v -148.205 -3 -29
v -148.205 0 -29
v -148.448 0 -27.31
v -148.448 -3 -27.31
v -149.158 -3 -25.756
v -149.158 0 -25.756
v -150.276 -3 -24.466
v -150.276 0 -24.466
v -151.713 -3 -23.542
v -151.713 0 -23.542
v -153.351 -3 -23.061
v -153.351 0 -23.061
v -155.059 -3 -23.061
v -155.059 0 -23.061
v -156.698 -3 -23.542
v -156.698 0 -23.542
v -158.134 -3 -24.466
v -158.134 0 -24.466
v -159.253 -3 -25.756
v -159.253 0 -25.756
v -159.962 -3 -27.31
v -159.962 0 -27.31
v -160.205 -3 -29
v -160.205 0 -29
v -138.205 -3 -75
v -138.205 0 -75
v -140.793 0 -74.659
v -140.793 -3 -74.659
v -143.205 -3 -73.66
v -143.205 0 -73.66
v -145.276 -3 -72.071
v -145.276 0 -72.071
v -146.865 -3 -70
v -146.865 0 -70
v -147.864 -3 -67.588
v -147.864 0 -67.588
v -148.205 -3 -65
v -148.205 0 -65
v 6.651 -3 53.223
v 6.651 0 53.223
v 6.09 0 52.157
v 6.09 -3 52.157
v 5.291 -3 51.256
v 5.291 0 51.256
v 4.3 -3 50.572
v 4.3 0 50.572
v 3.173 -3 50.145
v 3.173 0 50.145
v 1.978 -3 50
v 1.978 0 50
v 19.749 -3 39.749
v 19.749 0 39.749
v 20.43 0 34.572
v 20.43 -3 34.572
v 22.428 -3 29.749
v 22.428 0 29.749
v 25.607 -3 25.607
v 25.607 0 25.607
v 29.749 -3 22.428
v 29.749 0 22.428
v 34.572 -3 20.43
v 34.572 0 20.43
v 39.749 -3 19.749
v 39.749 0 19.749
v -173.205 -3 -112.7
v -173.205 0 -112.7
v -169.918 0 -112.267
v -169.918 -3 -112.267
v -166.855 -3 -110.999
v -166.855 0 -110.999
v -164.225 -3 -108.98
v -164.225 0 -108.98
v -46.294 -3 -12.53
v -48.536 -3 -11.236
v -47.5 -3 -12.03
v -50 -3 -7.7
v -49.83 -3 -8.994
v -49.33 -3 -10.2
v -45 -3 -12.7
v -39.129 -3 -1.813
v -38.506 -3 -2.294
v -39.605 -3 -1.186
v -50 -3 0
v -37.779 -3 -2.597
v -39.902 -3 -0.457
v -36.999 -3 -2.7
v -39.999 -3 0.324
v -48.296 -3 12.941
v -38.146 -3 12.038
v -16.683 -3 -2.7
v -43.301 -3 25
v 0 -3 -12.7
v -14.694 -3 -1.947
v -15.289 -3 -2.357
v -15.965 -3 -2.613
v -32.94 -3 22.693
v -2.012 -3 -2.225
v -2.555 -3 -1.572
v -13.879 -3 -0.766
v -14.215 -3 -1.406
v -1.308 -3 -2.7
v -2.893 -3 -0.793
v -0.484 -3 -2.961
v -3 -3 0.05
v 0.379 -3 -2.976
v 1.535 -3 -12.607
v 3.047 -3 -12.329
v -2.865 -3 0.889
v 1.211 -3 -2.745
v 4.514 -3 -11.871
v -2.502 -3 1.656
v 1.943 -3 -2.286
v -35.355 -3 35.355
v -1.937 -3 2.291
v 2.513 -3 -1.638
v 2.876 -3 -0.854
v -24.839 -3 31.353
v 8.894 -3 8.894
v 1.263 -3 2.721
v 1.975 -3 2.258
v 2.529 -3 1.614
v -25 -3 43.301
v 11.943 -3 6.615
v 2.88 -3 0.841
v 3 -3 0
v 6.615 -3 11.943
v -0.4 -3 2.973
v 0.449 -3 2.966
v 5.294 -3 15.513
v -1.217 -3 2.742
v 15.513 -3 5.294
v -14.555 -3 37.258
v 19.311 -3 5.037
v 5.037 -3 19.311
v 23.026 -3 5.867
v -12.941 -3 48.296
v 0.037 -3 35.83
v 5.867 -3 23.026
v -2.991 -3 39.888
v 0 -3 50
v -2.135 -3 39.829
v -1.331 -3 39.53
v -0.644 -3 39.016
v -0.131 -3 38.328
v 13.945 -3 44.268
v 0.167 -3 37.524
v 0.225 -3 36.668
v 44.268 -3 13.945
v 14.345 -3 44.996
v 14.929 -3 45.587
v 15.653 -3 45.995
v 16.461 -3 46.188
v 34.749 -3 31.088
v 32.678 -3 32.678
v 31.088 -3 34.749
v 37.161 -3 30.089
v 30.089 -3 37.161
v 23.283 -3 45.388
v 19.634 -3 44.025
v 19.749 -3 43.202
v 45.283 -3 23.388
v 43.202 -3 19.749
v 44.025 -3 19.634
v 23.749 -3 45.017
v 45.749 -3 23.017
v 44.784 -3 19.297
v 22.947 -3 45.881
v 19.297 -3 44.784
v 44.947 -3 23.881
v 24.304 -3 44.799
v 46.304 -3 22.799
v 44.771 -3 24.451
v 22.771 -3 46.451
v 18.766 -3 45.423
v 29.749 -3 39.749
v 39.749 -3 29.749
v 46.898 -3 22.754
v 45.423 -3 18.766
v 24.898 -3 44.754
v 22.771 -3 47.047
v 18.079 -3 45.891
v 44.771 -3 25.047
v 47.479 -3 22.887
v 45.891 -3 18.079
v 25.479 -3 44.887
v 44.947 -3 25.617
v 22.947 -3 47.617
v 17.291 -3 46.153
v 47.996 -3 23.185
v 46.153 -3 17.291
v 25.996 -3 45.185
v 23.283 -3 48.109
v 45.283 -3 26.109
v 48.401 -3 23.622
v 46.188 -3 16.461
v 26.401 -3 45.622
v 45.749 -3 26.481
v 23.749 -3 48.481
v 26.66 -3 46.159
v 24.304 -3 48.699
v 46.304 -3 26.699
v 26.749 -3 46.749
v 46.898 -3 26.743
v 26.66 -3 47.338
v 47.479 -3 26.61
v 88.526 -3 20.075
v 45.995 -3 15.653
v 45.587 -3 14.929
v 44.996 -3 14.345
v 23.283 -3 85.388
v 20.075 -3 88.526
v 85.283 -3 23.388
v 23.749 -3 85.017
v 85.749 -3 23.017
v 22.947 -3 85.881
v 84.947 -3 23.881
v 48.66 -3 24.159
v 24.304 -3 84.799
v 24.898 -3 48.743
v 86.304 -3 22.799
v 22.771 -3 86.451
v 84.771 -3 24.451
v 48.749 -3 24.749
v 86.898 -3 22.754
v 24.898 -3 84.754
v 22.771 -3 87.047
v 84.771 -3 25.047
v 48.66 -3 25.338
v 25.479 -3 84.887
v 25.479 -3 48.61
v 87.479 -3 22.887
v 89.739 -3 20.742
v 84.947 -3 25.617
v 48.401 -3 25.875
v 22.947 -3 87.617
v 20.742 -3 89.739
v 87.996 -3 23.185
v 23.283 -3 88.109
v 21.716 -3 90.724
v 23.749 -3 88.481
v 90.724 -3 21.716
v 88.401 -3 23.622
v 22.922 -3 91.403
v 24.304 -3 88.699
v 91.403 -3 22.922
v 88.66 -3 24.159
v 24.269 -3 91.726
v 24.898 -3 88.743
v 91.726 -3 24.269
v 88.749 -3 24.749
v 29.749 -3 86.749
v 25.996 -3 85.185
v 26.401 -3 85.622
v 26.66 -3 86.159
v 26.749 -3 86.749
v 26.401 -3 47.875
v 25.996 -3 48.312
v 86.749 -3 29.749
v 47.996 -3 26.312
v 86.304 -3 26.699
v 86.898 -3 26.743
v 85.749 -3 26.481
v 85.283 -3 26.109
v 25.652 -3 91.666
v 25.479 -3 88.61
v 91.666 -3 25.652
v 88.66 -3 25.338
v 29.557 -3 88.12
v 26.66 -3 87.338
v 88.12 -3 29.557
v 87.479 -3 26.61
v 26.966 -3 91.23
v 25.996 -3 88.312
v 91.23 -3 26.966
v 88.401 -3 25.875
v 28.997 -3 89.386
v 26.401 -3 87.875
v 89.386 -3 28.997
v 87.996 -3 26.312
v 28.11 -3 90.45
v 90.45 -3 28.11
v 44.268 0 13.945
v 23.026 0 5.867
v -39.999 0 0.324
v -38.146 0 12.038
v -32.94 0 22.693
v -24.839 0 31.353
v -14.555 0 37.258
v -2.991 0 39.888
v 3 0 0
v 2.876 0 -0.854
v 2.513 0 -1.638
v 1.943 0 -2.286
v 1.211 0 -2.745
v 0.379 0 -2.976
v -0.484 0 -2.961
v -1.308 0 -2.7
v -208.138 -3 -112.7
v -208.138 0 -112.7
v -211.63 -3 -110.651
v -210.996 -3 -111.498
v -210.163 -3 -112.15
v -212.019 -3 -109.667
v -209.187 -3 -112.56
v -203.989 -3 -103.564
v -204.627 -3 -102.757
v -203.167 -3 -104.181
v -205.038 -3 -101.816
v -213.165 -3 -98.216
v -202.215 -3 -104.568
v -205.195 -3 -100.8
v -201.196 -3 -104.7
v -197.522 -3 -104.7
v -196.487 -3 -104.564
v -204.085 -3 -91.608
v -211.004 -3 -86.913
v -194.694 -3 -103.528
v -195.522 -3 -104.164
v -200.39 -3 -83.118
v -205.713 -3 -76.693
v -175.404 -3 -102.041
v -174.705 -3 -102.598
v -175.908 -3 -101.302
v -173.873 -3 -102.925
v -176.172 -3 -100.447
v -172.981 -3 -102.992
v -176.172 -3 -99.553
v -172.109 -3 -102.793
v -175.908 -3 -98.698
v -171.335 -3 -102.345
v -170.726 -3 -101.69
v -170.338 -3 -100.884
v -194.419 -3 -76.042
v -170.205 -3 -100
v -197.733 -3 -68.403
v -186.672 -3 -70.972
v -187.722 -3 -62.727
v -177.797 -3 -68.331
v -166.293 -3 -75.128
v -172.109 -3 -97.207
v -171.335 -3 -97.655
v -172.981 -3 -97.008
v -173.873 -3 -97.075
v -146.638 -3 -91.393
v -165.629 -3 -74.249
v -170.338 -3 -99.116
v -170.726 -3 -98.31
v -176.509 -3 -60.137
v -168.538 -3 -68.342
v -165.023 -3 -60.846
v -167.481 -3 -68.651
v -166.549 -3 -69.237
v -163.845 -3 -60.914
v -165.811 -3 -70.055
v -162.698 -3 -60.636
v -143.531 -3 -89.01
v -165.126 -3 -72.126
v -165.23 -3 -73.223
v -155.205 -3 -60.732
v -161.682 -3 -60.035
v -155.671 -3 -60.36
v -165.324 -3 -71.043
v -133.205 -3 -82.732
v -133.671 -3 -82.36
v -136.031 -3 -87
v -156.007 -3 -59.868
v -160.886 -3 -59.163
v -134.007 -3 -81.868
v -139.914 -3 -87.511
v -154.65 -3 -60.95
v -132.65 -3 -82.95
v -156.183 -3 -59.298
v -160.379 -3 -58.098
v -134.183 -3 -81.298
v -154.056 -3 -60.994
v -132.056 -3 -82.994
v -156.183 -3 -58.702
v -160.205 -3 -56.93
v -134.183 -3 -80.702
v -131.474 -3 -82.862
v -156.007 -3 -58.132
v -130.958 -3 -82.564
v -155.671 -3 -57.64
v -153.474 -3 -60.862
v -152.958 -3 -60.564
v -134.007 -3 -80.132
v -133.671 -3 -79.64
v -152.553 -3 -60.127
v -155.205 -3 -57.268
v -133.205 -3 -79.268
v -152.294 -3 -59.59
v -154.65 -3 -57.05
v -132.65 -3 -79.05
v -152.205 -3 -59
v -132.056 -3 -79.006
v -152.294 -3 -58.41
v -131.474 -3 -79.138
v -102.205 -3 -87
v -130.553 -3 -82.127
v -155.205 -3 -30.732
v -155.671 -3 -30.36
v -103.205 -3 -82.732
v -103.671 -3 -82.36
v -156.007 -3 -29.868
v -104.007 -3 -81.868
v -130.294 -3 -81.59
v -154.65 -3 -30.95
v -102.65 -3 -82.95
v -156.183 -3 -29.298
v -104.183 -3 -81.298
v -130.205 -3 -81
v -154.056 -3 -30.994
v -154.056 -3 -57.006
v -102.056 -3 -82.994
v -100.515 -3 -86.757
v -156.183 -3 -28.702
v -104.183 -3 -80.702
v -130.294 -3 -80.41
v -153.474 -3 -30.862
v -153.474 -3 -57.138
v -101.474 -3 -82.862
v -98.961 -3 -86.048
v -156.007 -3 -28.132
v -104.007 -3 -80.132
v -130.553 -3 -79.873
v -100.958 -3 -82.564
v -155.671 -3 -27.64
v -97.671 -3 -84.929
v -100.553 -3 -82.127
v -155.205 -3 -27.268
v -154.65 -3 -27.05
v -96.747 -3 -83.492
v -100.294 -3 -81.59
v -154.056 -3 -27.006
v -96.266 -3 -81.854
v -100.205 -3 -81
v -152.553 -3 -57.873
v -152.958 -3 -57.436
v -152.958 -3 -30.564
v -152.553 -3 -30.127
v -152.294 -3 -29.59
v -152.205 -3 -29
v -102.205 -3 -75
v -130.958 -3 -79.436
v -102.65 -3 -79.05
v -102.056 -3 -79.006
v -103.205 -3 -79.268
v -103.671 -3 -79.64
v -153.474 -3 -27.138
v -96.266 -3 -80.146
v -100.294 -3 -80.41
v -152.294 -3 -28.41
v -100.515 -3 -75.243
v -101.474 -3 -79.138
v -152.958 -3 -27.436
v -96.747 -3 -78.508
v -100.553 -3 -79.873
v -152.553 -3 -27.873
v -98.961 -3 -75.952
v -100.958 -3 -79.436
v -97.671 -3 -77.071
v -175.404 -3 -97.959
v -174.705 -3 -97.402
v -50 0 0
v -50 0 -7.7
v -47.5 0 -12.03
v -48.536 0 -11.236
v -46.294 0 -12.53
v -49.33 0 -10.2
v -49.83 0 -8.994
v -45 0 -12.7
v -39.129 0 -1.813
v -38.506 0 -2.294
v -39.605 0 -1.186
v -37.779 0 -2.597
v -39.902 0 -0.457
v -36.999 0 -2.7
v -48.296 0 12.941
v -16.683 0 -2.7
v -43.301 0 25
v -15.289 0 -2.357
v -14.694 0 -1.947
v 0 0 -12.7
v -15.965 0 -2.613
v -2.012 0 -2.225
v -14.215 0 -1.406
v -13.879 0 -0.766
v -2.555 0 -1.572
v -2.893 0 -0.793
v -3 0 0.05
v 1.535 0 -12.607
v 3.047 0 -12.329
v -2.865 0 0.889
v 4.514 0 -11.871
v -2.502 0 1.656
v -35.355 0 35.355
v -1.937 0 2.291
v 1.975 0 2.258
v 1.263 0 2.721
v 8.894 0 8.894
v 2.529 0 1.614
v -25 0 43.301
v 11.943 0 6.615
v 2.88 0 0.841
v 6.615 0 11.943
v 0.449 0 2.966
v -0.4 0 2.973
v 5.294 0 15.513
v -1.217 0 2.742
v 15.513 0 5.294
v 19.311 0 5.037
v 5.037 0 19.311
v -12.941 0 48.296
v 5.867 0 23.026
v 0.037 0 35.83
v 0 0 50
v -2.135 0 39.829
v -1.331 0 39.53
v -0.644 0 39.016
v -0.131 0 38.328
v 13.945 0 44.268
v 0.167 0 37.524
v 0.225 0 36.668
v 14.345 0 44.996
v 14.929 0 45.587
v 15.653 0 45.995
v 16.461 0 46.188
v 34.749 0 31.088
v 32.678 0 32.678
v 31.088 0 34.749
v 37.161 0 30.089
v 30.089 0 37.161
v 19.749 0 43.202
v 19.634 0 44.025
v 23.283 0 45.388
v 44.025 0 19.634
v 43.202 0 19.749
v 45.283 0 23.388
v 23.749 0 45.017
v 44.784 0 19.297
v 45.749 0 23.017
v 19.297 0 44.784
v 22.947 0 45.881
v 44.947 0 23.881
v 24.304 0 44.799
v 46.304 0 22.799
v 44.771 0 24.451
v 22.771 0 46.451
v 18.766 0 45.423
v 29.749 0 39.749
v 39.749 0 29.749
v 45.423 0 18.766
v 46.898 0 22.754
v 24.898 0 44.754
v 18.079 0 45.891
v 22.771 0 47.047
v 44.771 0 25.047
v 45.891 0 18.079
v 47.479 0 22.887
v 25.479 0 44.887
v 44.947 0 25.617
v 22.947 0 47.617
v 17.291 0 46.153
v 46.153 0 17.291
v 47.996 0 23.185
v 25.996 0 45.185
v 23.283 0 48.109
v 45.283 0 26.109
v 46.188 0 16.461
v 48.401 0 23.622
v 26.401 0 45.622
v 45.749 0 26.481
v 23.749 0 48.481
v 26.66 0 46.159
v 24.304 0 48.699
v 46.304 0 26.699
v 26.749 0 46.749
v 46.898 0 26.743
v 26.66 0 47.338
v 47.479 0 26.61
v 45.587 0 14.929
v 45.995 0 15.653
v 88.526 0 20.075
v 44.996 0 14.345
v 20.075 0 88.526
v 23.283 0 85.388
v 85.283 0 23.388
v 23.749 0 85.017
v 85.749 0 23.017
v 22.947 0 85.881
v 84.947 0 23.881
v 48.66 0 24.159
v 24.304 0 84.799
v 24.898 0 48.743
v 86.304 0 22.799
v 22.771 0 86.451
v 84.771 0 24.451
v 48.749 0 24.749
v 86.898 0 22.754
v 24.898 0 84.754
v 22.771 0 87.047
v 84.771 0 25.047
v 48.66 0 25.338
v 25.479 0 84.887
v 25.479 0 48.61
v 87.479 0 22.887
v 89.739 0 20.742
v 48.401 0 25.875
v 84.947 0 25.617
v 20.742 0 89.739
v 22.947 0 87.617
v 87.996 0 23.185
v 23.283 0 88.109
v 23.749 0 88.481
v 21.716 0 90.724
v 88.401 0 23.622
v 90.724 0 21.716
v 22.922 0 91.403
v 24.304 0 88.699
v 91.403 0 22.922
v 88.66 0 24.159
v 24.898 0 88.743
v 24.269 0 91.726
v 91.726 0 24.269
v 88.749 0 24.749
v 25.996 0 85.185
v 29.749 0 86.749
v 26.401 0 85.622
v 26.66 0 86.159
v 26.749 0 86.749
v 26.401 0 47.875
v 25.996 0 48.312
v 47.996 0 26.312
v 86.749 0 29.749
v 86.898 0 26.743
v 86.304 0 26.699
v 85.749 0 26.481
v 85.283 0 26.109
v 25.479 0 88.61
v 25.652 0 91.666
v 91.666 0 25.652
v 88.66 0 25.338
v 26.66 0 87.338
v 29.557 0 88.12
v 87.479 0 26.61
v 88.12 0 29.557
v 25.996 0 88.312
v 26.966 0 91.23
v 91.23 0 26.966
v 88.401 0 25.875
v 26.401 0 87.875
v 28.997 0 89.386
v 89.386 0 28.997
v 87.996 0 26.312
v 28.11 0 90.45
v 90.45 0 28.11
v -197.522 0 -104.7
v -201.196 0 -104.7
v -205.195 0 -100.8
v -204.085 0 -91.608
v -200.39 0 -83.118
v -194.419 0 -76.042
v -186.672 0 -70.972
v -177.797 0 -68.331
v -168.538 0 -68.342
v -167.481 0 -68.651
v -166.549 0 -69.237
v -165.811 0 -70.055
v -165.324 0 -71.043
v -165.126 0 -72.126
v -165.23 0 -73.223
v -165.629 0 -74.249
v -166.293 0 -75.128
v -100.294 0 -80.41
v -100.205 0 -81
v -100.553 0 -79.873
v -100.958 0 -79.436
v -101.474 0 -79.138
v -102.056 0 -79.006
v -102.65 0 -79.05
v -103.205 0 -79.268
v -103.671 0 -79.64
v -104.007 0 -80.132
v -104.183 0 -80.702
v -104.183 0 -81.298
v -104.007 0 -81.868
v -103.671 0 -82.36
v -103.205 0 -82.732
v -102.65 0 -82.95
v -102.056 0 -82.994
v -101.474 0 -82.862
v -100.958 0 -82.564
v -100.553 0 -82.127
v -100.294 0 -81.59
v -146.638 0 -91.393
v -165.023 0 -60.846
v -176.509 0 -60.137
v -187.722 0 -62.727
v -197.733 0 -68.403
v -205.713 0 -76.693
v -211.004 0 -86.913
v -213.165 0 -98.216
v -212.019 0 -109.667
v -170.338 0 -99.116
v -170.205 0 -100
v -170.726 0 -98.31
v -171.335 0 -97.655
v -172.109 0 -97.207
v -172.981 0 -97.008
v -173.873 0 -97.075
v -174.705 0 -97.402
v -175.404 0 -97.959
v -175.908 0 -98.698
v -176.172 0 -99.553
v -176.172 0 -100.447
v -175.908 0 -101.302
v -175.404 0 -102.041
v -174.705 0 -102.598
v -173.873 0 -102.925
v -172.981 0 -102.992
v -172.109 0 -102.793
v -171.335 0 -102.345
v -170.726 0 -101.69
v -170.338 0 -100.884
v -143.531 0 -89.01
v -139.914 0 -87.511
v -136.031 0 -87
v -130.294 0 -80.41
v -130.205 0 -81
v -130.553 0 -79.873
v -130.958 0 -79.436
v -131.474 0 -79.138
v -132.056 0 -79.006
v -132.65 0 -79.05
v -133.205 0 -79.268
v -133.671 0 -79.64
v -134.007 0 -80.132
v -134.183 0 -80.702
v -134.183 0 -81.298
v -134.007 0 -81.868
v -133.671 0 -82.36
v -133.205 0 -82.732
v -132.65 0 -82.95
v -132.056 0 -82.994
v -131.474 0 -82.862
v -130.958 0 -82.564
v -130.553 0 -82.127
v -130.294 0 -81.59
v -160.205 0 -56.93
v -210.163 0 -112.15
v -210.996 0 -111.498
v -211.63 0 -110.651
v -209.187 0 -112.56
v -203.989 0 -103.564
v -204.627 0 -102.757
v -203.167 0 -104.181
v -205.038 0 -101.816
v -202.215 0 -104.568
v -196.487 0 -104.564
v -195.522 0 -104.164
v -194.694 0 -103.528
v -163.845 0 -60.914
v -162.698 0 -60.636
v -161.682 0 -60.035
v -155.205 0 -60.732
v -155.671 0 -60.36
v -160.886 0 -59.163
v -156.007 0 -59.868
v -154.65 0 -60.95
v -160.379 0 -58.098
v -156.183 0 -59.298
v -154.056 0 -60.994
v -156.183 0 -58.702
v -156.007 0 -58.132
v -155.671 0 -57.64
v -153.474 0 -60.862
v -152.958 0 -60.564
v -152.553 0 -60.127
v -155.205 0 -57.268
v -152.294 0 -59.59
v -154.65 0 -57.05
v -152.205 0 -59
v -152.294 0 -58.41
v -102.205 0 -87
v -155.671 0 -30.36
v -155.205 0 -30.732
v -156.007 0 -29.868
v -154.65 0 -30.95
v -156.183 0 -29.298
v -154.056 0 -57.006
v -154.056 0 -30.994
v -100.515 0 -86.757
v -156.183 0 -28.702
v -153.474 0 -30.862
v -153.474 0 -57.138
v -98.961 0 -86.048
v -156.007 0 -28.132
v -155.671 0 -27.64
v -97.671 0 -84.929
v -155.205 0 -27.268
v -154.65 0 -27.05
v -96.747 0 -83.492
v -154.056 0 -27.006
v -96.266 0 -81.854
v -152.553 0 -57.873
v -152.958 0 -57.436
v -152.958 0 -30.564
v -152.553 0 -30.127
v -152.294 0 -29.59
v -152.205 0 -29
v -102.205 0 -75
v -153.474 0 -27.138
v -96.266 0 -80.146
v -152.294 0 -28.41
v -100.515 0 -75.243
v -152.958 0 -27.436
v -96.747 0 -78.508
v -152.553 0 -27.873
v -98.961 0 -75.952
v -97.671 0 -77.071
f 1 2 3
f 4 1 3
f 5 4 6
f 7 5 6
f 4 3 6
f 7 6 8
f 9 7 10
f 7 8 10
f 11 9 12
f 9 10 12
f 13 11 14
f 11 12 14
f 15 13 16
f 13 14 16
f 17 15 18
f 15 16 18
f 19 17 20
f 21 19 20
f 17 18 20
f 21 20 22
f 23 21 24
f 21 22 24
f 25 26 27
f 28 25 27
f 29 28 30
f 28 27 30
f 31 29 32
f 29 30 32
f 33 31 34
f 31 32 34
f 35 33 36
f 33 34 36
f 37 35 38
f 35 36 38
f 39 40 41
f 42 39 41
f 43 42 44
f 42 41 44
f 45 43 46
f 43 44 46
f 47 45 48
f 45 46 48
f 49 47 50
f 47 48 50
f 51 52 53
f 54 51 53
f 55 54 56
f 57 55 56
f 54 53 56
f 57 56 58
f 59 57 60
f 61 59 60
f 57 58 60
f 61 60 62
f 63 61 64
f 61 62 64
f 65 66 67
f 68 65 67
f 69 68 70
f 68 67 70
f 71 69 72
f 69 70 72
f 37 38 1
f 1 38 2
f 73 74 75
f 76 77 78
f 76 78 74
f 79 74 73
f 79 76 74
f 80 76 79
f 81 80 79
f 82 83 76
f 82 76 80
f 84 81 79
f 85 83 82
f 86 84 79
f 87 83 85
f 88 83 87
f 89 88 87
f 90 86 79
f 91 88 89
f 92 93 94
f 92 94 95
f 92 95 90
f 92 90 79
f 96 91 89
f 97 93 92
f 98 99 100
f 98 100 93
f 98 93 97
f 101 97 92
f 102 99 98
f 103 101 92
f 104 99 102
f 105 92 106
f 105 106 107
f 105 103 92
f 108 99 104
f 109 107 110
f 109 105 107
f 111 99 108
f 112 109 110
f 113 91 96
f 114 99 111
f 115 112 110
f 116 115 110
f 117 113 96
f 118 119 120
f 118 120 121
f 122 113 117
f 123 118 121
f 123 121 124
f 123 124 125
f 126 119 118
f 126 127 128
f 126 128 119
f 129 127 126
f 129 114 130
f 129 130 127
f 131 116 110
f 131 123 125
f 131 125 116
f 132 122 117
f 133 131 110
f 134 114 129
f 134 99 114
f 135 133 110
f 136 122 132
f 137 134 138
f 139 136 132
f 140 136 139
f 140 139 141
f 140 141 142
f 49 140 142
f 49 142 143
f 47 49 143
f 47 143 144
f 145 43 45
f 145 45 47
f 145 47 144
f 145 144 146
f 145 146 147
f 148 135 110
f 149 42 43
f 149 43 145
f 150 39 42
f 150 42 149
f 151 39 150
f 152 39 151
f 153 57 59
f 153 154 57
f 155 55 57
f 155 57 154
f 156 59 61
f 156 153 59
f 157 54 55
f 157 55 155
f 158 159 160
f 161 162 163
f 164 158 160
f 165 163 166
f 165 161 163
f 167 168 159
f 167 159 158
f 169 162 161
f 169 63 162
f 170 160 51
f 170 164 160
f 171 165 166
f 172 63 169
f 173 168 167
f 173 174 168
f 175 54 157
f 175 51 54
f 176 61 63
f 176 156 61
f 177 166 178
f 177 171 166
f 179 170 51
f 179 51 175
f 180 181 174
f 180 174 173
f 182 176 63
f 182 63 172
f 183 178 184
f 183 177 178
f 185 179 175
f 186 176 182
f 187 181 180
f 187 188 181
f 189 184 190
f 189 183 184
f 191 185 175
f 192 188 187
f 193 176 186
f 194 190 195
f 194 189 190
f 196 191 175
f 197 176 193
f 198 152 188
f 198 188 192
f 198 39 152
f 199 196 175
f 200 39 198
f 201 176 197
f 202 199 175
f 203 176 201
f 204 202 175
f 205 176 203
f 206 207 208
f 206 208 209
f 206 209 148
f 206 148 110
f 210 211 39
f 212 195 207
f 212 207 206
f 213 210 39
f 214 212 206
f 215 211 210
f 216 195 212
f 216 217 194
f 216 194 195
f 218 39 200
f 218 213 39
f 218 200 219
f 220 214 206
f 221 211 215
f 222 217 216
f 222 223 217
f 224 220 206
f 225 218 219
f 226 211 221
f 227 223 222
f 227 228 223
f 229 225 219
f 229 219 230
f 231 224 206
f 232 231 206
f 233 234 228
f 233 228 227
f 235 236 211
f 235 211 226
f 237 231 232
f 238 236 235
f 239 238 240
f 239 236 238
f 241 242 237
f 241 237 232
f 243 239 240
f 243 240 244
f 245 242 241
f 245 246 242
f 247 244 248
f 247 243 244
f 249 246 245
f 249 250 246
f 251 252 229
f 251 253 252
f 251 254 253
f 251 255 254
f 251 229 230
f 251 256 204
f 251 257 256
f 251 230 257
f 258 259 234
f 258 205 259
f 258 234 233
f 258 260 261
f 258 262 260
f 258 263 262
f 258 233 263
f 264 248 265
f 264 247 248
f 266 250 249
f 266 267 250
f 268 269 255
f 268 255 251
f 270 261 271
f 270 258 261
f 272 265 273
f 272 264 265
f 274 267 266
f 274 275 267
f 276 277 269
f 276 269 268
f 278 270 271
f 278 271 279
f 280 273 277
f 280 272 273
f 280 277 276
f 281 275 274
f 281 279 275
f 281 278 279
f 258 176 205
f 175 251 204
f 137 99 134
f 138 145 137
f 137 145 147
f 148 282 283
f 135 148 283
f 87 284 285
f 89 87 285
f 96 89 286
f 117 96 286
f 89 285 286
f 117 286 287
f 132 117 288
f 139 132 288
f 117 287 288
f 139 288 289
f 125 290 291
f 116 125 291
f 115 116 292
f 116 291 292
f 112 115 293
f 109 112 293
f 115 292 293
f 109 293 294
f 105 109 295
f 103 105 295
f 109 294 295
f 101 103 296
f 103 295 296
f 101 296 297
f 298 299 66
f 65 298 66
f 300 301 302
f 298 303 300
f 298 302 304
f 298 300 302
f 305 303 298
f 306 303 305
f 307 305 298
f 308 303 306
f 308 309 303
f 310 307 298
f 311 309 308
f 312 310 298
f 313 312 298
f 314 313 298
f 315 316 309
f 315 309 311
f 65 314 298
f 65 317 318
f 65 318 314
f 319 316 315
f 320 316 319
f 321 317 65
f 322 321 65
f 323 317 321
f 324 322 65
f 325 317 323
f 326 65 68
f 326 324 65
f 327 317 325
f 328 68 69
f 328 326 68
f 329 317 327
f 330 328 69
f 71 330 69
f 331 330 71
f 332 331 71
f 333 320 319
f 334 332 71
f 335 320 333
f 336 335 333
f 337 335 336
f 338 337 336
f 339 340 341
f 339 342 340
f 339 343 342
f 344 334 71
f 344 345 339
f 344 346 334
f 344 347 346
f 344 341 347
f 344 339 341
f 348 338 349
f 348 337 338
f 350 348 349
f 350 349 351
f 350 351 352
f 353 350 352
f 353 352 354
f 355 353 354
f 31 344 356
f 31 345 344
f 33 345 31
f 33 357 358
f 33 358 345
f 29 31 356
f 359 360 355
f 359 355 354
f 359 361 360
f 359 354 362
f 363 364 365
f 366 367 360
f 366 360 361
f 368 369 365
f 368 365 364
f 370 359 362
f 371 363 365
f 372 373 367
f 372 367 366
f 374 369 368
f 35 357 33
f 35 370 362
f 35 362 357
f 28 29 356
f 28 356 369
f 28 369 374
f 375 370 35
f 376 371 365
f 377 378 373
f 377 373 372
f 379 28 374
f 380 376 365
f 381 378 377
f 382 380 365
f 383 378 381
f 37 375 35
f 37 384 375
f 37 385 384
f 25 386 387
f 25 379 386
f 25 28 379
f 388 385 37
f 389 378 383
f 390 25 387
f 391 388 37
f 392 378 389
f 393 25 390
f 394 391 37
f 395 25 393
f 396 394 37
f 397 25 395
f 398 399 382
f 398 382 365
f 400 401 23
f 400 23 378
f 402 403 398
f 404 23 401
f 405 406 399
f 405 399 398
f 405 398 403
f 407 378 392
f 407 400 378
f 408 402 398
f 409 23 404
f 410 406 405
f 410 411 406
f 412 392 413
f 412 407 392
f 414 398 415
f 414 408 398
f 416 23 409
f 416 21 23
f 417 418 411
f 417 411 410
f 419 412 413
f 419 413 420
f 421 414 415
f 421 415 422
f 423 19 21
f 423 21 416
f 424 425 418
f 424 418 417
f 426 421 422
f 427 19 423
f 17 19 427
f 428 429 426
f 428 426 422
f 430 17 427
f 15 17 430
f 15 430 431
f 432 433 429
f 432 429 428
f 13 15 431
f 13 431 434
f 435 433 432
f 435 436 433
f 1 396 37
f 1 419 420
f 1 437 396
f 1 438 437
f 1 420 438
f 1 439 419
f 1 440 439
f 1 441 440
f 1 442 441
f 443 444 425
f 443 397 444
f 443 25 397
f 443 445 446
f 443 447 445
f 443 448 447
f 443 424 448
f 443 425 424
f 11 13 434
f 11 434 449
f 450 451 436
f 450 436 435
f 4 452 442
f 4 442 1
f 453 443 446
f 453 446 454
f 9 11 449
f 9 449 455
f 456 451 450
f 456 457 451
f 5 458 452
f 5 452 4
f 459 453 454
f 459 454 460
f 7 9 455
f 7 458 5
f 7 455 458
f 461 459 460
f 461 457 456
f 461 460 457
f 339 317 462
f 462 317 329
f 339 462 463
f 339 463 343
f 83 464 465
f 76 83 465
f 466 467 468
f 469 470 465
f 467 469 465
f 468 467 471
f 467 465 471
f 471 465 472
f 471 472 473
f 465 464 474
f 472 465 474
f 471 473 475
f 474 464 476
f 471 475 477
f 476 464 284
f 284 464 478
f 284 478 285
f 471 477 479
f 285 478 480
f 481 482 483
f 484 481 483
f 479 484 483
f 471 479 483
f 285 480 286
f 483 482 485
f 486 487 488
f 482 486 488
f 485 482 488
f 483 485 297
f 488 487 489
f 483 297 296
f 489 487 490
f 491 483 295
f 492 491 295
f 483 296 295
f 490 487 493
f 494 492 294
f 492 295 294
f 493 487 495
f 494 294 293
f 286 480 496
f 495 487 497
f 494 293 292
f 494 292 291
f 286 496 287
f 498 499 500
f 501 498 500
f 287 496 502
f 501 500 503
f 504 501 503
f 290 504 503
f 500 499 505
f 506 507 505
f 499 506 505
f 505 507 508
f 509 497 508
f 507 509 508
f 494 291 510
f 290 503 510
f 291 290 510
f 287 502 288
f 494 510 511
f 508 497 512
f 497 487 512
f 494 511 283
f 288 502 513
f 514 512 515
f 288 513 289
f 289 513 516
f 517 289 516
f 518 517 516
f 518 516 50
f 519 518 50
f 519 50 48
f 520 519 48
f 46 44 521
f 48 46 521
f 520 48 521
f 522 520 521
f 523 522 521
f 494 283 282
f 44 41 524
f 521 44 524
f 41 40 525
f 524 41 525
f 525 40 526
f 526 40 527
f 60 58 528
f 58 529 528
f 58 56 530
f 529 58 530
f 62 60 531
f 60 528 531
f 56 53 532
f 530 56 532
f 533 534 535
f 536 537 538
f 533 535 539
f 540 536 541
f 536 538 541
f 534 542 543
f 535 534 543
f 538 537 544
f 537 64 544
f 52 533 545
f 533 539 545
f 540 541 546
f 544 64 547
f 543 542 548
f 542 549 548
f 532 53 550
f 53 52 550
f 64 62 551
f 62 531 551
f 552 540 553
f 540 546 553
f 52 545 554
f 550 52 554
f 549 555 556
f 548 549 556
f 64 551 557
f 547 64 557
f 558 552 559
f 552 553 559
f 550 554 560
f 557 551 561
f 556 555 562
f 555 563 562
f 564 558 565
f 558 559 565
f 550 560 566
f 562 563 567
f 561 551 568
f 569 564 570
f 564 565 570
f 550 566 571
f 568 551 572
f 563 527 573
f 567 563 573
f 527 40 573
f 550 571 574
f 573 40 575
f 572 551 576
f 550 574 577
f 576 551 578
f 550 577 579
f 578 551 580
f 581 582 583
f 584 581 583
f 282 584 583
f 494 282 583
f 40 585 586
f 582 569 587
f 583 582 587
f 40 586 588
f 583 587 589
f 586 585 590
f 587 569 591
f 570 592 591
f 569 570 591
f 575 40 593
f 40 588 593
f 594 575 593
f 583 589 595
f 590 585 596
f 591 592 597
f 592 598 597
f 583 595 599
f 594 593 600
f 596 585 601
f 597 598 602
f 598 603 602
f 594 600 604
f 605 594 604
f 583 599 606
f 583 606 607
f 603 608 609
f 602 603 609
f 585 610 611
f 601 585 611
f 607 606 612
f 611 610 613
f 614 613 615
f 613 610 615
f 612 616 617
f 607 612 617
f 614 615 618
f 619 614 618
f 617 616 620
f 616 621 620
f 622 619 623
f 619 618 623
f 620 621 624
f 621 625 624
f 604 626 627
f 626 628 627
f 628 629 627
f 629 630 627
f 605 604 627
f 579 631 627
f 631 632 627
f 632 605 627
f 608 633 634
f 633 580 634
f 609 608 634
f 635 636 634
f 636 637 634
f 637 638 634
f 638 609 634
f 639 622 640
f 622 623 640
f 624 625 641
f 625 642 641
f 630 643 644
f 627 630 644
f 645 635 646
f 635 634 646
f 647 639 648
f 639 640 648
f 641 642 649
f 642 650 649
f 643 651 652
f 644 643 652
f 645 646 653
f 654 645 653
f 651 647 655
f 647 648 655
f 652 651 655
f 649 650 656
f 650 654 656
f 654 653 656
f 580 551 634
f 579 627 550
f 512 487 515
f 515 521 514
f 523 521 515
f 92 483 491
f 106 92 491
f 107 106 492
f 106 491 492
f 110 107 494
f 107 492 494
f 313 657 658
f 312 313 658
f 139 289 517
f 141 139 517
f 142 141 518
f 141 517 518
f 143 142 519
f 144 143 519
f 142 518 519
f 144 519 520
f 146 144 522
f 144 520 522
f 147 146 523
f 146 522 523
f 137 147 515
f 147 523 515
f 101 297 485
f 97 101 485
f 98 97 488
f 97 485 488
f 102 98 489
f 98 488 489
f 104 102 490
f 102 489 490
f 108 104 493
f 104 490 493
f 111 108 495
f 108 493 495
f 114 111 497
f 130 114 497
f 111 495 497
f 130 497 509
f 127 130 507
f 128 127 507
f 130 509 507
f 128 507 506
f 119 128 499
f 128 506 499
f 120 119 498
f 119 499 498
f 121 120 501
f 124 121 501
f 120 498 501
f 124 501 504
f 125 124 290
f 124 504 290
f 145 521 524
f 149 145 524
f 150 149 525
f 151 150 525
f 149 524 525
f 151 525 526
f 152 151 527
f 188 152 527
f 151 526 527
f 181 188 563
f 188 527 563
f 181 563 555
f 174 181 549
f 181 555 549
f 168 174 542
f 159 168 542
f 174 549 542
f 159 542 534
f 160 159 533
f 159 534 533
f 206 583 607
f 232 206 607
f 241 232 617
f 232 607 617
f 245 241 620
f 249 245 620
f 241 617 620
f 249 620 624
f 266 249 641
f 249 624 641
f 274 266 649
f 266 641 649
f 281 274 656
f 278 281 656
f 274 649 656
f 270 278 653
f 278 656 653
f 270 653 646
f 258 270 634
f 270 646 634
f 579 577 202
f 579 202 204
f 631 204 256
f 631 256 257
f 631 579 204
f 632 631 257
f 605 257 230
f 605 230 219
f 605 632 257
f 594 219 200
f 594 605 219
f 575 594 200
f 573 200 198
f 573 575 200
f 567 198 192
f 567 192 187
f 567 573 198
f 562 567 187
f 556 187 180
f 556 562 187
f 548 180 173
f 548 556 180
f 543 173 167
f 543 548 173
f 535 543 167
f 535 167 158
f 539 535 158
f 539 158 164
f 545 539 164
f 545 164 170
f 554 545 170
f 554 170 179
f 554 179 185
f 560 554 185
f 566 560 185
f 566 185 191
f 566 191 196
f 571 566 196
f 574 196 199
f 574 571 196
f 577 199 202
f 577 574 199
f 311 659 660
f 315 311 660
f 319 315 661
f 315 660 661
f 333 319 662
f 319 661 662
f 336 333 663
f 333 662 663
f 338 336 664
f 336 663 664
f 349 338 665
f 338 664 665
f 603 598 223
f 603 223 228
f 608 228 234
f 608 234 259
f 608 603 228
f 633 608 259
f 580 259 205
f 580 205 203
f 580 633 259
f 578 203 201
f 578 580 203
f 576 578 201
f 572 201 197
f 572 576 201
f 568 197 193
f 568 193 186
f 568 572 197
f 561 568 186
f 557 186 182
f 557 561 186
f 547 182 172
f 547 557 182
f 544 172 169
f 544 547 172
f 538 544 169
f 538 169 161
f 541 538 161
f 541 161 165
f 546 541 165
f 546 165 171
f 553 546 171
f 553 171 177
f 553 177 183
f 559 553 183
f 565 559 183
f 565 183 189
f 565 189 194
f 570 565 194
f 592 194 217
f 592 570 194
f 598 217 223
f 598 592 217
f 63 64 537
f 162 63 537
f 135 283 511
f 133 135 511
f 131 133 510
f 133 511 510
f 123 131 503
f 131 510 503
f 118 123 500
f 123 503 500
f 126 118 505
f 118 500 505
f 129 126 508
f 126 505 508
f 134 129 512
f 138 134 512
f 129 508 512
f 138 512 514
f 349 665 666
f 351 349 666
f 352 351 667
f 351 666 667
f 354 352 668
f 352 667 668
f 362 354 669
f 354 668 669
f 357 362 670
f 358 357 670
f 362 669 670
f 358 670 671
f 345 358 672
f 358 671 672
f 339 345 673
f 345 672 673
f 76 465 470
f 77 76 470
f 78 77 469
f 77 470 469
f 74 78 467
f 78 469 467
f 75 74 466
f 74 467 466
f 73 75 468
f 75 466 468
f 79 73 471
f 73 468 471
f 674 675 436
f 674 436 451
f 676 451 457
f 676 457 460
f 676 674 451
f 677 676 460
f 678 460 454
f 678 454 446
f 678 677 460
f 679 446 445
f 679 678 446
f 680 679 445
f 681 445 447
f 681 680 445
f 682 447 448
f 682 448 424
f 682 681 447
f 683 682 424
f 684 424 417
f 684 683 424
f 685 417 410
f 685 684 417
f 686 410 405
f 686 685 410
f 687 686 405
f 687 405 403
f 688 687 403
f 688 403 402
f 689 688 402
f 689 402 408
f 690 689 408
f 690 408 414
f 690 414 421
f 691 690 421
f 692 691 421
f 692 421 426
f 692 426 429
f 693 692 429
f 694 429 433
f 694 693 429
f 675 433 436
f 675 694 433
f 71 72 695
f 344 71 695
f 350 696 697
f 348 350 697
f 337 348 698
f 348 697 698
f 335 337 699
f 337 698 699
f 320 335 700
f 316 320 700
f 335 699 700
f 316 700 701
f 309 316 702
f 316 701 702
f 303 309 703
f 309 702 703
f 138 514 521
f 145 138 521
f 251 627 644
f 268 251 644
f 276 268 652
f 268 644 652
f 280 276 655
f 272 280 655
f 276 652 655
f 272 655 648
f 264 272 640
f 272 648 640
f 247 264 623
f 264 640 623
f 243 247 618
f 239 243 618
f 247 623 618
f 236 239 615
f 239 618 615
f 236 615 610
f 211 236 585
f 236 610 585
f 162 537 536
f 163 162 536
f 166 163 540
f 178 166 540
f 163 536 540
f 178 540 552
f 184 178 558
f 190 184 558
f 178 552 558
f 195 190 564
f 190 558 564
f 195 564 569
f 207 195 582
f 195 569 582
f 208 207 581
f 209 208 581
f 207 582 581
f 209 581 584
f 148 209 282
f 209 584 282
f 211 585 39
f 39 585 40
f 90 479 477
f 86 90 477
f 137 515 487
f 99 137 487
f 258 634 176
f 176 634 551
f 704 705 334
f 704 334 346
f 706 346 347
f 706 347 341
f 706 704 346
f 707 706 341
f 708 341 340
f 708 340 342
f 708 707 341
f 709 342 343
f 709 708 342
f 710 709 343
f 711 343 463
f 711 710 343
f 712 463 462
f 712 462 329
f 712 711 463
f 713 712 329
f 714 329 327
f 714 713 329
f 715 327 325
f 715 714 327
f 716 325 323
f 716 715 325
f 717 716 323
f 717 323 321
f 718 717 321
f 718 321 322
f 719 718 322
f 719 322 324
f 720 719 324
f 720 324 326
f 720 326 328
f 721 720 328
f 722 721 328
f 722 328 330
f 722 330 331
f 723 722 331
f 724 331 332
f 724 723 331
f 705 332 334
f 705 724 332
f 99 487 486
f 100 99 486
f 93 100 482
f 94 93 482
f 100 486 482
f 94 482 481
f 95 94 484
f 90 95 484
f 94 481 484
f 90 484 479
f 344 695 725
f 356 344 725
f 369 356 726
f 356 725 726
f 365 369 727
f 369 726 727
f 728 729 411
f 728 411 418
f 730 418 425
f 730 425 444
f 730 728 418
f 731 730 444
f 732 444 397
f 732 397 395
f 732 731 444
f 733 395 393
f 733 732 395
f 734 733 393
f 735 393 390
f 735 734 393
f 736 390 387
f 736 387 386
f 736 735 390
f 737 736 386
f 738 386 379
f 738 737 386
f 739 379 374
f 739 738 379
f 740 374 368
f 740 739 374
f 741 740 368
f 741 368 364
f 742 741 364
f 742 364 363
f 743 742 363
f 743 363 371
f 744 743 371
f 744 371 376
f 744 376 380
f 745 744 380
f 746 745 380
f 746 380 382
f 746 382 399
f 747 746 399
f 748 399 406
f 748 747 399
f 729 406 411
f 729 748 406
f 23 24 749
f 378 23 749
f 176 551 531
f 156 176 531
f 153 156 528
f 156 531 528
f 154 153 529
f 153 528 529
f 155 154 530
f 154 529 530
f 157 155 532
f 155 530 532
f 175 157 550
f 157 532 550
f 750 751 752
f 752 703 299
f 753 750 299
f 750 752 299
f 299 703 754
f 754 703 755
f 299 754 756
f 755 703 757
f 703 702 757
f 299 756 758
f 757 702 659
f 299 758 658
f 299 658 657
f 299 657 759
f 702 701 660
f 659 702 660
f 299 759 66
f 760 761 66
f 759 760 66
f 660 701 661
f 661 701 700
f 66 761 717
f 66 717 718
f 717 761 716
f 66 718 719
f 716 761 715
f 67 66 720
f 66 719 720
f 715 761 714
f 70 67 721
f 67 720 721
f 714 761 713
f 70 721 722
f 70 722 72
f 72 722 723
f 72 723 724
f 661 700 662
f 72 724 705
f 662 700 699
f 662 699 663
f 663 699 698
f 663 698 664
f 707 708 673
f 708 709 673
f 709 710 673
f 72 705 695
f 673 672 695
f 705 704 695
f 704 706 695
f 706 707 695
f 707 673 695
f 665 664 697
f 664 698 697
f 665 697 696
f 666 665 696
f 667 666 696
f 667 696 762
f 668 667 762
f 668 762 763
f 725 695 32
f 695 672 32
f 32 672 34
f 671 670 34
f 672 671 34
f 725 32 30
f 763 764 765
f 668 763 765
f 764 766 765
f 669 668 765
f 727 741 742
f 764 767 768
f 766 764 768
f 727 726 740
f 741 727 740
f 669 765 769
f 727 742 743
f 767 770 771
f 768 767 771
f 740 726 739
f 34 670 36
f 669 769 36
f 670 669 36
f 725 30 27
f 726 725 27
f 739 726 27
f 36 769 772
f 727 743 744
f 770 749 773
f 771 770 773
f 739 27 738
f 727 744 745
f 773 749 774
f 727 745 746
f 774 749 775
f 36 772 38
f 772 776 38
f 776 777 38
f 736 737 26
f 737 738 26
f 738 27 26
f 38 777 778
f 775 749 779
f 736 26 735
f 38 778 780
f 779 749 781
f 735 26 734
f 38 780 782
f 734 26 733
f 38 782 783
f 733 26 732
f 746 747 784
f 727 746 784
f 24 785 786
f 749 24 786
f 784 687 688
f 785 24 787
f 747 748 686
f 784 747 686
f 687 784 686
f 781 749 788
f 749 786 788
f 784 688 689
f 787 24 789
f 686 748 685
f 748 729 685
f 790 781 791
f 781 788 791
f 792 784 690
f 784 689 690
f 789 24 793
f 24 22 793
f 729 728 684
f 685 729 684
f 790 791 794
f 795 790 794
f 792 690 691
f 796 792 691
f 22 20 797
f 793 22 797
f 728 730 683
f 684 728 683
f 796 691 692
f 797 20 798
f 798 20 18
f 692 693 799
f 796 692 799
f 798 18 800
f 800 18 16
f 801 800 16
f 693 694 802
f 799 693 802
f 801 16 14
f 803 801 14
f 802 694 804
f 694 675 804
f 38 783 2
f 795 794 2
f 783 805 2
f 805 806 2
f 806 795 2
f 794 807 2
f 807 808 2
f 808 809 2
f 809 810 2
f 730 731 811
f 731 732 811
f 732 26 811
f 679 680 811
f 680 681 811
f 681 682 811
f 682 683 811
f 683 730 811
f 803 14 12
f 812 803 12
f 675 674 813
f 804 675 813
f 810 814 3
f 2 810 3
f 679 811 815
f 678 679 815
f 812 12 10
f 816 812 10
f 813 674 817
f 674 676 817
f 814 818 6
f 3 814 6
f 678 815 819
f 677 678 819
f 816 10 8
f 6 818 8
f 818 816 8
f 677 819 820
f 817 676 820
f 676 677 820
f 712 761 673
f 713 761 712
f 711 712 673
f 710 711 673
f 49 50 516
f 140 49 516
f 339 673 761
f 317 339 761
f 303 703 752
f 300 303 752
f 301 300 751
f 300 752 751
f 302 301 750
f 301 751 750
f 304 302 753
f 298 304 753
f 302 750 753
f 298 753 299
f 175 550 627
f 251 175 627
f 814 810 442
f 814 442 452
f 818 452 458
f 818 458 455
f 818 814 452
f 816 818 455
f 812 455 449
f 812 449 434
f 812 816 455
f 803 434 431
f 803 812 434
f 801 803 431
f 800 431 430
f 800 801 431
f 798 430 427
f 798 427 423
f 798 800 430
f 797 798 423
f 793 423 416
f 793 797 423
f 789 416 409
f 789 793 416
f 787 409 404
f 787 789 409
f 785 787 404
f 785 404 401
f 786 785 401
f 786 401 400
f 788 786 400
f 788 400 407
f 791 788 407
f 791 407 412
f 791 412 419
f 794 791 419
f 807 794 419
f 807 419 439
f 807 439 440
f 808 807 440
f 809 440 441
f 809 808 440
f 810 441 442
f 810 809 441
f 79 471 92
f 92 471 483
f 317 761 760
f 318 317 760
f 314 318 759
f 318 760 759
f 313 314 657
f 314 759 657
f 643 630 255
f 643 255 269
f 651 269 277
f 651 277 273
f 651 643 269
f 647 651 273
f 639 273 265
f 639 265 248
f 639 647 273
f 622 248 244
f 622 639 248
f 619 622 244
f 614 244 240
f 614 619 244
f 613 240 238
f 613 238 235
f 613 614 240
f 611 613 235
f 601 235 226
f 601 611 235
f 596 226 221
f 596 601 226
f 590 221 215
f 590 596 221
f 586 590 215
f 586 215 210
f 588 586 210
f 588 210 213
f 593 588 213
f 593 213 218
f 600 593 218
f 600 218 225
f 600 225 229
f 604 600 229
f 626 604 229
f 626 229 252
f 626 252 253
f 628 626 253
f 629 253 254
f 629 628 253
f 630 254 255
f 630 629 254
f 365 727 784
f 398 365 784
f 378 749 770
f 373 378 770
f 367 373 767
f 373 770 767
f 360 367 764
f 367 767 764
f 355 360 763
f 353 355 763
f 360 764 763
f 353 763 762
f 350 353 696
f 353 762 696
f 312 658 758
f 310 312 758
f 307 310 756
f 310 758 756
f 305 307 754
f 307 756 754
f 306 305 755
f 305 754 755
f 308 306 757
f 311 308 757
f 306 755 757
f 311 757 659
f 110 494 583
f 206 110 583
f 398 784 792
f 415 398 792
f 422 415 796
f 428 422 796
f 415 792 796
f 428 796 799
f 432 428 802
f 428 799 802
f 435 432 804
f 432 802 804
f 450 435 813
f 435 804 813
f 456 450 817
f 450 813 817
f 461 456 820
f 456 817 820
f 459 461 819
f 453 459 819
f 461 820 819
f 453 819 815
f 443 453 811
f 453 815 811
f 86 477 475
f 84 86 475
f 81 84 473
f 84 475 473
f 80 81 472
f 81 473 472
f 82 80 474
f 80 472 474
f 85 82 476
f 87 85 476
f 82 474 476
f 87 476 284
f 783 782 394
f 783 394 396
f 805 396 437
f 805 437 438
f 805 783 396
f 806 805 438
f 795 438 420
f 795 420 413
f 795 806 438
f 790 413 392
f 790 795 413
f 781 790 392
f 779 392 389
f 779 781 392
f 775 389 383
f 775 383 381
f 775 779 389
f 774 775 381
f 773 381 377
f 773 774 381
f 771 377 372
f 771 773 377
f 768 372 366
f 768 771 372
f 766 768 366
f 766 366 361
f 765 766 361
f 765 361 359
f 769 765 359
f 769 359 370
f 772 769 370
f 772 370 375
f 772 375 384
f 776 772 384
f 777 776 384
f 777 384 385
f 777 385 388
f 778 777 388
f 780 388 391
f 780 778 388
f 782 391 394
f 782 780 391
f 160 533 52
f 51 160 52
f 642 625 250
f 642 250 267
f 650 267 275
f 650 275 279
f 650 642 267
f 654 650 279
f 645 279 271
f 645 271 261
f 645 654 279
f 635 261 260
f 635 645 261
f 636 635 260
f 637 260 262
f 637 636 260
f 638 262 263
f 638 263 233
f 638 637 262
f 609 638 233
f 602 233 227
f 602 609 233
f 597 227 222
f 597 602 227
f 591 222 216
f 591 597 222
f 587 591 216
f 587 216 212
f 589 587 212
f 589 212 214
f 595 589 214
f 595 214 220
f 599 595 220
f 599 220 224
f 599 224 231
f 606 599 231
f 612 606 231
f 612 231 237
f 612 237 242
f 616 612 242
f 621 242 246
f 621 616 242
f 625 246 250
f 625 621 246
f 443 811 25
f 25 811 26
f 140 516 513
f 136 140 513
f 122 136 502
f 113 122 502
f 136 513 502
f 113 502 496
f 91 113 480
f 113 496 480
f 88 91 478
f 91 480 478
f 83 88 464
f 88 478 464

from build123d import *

# Parameters (mm, degrees)
F0_R     = 2
F1_DEPTH = 3
F2_R     = 3
F2_R_2   = 2
F3_DEPTH = 3


with BuildPart() as f1:
    # F0 (on Front) → F1 (new body)
    with BuildSketch(Plane.XZ):
        with BuildLine():
            Line((1.9775541105, 50), (0, 50))
            ThreePointArc((0, 50), (-35.3553390593, 35.3553390593), (-50, 0))
            Line((-50, 0), (-50, -7.7))
            ThreePointArc((-50, -7.7), (-48.5355339059, -11.2355339059), (-45, -12.7))
            Line((-45, -12.7), (0, -12.7))
            ThreePointArc((0, -12.7), (2.2947246058, -12.490966295), (4.5139098752, -11.8707462966))
            Line((4.5139098752, -11.8707462966), (88.5258672136, 20.0752151775))
            ThreePointArc((88.5258672136, 20.0752151775), (91.6664406073, 25.6521722257), (86.7487373415, 29.7487373415))
            Line((86.7487373415, 29.7487373415), (39.7487373415, 29.7487373415))
            ThreePointArc((39.7487373415, 29.7487373415), (32.6776695297, 32.6776695297), (29.7487373415, 39.7487373415))
            Line((29.7487373415, 39.7487373415), (29.7487373415, 86.7487373415))
            ThreePointArc((29.7487373415, 86.7487373415), (25.6521722257, 91.6664406073), (20.0752151775, 88.5258672136))
            Line((20.0752151775, 88.5258672136), (6.6510762745, 53.2228701279))
            ThreePointArc((6.6510762745, 53.2228701279), (4.8160705046, 50.88383374), (1.9775541105, 50))
        make_face()
        with BuildLine():
            ThreePointArc((-1.3076696831, -2.7), (-1.5932656638, 2.5419489618), (3, 0))
            ThreePointArc((3, 0), (1.5932656638, -2.5419489618), (-1.3076696831, -2.7))
        make_face(mode=Mode.SUBTRACT)
        with BuildLine():
            Line((-16.6826770692, -2.7), (-36.9987837638, -2.7))
            ThreePointArc((-36.9987837638, -2.7), (-39.1286866927, -1.8127028929), (-39.99868515, 0.3243243243))
            ThreePointArc((-39.99868515, 0.3243243243), (-29.2121630402, 27.3248884813), (-2.9910381263, 39.8880143768))
            ThreePointArc((-2.9910381263, 39.8880143768), (-0.3624601289, 38.690732466), (0.0374030316, 35.8301353753))
            Line((0.0374030316, 35.8301353753), (-13.8785637708, -0.7662779233))
            ThreePointArc((-13.8785637708, -0.7662779233), (-14.9795672328, -2.169699756), (-16.6826770692, -2.7))
        make_face(mode=Mode.SUBTRACT)
        with BuildLine():
            Line((44.2682950578, 13.9446240431), (23.0257917018, 5.8670572857))
            ThreePointArc((23.0257917018, 5.8670572857), (8.8941060522, 8.8941060522), (5.8670572857, 23.0257917018))
            Line((5.8670572857, 23.0257917018), (13.9446240431, 44.2682950578))
            ThreePointArc((13.9446240431, 44.2682950578), (17.290798272, 46.152639094), (19.7487373415, 43.2020171345))
            Line((19.7487373415, 43.2020171345), (19.7487373415, 39.7487373415))
            ThreePointArc((19.7487373415, 39.7487373415), (25.6066017178, 25.6066017178), (39.7487373415, 19.7487373415))
            Line((39.7487373415, 19.7487373415), (43.2020171345, 19.7487373415))
            ThreePointArc((43.2020171345, 19.7487373415), (46.152639094, 17.290798272), (44.2682950578, 13.9446240431))
        make_face(mode=Mode.SUBTRACT)
        with Locations((46.7487373415, 24.7487373415)):
            Circle(F0_R, mode=Mode.SUBTRACT)
        with Locations((86.7487373415, 24.7487373415)):
            Circle(F0_R, mode=Mode.SUBTRACT)
        with Locations((24.7487373415, 46.7487373415)):
            Circle(F0_R, mode=Mode.SUBTRACT)
        with Locations((24.7487373415, 86.7487373415)):
            Circle(F0_R, mode=Mode.SUBTRACT)
    extrude(amount=F1_DEPTH)


with BuildPart() as f3:
    # F2 (on Front) → F3 (new body)
    with BuildSketch(Plane.XZ):
        with BuildLine():
            ThreePointArc((-160.2050807569, -56.9302890653), (-161.6824558613, -60.0345383524), (-165.0232625751, -60.8457173321))
            ThreePointArc((-165.0232625751, -60.8457173321), (-202.0227771946, -72.2594093065), (-212.0194538106, -109.6666666667))
            ThreePointArc((-212.0194538106, -109.6666666667), (-210.6010769322, -111.8517191076), (-208.1380165053, -112.7))
            Line((-208.1380165053, -112.7), (-173.2050807569, -112.7))
            ThreePointArc((-173.2050807569, -112.7), (-168.3450011659, -111.7332700629), (-164.2248246358, -108.9802561211))
            Line((-164.2248246358, -108.9802561211), (-146.637966797, -91.3933982822))
            ThreePointArc((-146.637966797, -91.3933982822), (-141.7716165646, -88.1418070123), (-136.0313650792, -87))
            Line((-136.0313650792, -87), (-102.2050807569, -87))
            ThreePointArc((-102.2050807569, -87), (-96.2050807569, -81), (-102.2050807569, -75))
            Line((-102.2050807569, -75), (-138.2050807569, -75))
            ThreePointArc((-138.2050807569, -75), (-145.2761485688, -72.0710678119), (-148.2050807569, -65))
            Line((-148.2050807569, -65), (-148.2050807569, -29))
            ThreePointArc((-148.2050807569, -29), (-154.2050807569, -23), (-160.2050807569, -29))
            Line((-160.2050807569, -29), (-160.2050807569, -56.9302890653))
        make_face()
        with Locations((-173.2050807569, -100)):
            Circle(F2_R, mode=Mode.SUBTRACT)
        with BuildLine():
            ThreePointArc((-168.5384569133, -68.342100166), (-165.3242423655, -71.0428859963), (-166.293357769, -75.12776477))
            Line((-166.293357769, -75.12776477), (-194.6940201238, -103.5284271247))
            ThreePointArc((-194.6940201238, -103.5284271247), (-195.9917135191, -104.39551813), (-197.5224472485, -104.7))
            Line((-197.5224472485, -104.7), (-201.1963293893, -104.7))
            ThreePointArc((-201.1963293893, -104.7), (-203.989177398, -103.5635642127), (-205.1950791939, -100.8))
            ThreePointArc((-205.1950791939, -100.8), (-194.4187677349, -76.0421310464), (-168.5384569133, -68.342100166))
        make_face(mode=Mode.SUBTRACT)
        with Locations((-132.2050807569, -81)):
            Circle(F2_R_2, mode=Mode.SUBTRACT)
        with Locations((-102.2050807569, -81)):
            Circle(F2_R_2, mode=Mode.SUBTRACT)
        with Locations((-154.2050807569, -59)):
            Circle(F2_R_2, mode=Mode.SUBTRACT)
        with Locations((-154.2050807569, -29)):
            Circle(F2_R_2, mode=Mode.SUBTRACT)
    extrude(amount=F3_DEPTH)


solid = Compound([f1.part, f3.part])
